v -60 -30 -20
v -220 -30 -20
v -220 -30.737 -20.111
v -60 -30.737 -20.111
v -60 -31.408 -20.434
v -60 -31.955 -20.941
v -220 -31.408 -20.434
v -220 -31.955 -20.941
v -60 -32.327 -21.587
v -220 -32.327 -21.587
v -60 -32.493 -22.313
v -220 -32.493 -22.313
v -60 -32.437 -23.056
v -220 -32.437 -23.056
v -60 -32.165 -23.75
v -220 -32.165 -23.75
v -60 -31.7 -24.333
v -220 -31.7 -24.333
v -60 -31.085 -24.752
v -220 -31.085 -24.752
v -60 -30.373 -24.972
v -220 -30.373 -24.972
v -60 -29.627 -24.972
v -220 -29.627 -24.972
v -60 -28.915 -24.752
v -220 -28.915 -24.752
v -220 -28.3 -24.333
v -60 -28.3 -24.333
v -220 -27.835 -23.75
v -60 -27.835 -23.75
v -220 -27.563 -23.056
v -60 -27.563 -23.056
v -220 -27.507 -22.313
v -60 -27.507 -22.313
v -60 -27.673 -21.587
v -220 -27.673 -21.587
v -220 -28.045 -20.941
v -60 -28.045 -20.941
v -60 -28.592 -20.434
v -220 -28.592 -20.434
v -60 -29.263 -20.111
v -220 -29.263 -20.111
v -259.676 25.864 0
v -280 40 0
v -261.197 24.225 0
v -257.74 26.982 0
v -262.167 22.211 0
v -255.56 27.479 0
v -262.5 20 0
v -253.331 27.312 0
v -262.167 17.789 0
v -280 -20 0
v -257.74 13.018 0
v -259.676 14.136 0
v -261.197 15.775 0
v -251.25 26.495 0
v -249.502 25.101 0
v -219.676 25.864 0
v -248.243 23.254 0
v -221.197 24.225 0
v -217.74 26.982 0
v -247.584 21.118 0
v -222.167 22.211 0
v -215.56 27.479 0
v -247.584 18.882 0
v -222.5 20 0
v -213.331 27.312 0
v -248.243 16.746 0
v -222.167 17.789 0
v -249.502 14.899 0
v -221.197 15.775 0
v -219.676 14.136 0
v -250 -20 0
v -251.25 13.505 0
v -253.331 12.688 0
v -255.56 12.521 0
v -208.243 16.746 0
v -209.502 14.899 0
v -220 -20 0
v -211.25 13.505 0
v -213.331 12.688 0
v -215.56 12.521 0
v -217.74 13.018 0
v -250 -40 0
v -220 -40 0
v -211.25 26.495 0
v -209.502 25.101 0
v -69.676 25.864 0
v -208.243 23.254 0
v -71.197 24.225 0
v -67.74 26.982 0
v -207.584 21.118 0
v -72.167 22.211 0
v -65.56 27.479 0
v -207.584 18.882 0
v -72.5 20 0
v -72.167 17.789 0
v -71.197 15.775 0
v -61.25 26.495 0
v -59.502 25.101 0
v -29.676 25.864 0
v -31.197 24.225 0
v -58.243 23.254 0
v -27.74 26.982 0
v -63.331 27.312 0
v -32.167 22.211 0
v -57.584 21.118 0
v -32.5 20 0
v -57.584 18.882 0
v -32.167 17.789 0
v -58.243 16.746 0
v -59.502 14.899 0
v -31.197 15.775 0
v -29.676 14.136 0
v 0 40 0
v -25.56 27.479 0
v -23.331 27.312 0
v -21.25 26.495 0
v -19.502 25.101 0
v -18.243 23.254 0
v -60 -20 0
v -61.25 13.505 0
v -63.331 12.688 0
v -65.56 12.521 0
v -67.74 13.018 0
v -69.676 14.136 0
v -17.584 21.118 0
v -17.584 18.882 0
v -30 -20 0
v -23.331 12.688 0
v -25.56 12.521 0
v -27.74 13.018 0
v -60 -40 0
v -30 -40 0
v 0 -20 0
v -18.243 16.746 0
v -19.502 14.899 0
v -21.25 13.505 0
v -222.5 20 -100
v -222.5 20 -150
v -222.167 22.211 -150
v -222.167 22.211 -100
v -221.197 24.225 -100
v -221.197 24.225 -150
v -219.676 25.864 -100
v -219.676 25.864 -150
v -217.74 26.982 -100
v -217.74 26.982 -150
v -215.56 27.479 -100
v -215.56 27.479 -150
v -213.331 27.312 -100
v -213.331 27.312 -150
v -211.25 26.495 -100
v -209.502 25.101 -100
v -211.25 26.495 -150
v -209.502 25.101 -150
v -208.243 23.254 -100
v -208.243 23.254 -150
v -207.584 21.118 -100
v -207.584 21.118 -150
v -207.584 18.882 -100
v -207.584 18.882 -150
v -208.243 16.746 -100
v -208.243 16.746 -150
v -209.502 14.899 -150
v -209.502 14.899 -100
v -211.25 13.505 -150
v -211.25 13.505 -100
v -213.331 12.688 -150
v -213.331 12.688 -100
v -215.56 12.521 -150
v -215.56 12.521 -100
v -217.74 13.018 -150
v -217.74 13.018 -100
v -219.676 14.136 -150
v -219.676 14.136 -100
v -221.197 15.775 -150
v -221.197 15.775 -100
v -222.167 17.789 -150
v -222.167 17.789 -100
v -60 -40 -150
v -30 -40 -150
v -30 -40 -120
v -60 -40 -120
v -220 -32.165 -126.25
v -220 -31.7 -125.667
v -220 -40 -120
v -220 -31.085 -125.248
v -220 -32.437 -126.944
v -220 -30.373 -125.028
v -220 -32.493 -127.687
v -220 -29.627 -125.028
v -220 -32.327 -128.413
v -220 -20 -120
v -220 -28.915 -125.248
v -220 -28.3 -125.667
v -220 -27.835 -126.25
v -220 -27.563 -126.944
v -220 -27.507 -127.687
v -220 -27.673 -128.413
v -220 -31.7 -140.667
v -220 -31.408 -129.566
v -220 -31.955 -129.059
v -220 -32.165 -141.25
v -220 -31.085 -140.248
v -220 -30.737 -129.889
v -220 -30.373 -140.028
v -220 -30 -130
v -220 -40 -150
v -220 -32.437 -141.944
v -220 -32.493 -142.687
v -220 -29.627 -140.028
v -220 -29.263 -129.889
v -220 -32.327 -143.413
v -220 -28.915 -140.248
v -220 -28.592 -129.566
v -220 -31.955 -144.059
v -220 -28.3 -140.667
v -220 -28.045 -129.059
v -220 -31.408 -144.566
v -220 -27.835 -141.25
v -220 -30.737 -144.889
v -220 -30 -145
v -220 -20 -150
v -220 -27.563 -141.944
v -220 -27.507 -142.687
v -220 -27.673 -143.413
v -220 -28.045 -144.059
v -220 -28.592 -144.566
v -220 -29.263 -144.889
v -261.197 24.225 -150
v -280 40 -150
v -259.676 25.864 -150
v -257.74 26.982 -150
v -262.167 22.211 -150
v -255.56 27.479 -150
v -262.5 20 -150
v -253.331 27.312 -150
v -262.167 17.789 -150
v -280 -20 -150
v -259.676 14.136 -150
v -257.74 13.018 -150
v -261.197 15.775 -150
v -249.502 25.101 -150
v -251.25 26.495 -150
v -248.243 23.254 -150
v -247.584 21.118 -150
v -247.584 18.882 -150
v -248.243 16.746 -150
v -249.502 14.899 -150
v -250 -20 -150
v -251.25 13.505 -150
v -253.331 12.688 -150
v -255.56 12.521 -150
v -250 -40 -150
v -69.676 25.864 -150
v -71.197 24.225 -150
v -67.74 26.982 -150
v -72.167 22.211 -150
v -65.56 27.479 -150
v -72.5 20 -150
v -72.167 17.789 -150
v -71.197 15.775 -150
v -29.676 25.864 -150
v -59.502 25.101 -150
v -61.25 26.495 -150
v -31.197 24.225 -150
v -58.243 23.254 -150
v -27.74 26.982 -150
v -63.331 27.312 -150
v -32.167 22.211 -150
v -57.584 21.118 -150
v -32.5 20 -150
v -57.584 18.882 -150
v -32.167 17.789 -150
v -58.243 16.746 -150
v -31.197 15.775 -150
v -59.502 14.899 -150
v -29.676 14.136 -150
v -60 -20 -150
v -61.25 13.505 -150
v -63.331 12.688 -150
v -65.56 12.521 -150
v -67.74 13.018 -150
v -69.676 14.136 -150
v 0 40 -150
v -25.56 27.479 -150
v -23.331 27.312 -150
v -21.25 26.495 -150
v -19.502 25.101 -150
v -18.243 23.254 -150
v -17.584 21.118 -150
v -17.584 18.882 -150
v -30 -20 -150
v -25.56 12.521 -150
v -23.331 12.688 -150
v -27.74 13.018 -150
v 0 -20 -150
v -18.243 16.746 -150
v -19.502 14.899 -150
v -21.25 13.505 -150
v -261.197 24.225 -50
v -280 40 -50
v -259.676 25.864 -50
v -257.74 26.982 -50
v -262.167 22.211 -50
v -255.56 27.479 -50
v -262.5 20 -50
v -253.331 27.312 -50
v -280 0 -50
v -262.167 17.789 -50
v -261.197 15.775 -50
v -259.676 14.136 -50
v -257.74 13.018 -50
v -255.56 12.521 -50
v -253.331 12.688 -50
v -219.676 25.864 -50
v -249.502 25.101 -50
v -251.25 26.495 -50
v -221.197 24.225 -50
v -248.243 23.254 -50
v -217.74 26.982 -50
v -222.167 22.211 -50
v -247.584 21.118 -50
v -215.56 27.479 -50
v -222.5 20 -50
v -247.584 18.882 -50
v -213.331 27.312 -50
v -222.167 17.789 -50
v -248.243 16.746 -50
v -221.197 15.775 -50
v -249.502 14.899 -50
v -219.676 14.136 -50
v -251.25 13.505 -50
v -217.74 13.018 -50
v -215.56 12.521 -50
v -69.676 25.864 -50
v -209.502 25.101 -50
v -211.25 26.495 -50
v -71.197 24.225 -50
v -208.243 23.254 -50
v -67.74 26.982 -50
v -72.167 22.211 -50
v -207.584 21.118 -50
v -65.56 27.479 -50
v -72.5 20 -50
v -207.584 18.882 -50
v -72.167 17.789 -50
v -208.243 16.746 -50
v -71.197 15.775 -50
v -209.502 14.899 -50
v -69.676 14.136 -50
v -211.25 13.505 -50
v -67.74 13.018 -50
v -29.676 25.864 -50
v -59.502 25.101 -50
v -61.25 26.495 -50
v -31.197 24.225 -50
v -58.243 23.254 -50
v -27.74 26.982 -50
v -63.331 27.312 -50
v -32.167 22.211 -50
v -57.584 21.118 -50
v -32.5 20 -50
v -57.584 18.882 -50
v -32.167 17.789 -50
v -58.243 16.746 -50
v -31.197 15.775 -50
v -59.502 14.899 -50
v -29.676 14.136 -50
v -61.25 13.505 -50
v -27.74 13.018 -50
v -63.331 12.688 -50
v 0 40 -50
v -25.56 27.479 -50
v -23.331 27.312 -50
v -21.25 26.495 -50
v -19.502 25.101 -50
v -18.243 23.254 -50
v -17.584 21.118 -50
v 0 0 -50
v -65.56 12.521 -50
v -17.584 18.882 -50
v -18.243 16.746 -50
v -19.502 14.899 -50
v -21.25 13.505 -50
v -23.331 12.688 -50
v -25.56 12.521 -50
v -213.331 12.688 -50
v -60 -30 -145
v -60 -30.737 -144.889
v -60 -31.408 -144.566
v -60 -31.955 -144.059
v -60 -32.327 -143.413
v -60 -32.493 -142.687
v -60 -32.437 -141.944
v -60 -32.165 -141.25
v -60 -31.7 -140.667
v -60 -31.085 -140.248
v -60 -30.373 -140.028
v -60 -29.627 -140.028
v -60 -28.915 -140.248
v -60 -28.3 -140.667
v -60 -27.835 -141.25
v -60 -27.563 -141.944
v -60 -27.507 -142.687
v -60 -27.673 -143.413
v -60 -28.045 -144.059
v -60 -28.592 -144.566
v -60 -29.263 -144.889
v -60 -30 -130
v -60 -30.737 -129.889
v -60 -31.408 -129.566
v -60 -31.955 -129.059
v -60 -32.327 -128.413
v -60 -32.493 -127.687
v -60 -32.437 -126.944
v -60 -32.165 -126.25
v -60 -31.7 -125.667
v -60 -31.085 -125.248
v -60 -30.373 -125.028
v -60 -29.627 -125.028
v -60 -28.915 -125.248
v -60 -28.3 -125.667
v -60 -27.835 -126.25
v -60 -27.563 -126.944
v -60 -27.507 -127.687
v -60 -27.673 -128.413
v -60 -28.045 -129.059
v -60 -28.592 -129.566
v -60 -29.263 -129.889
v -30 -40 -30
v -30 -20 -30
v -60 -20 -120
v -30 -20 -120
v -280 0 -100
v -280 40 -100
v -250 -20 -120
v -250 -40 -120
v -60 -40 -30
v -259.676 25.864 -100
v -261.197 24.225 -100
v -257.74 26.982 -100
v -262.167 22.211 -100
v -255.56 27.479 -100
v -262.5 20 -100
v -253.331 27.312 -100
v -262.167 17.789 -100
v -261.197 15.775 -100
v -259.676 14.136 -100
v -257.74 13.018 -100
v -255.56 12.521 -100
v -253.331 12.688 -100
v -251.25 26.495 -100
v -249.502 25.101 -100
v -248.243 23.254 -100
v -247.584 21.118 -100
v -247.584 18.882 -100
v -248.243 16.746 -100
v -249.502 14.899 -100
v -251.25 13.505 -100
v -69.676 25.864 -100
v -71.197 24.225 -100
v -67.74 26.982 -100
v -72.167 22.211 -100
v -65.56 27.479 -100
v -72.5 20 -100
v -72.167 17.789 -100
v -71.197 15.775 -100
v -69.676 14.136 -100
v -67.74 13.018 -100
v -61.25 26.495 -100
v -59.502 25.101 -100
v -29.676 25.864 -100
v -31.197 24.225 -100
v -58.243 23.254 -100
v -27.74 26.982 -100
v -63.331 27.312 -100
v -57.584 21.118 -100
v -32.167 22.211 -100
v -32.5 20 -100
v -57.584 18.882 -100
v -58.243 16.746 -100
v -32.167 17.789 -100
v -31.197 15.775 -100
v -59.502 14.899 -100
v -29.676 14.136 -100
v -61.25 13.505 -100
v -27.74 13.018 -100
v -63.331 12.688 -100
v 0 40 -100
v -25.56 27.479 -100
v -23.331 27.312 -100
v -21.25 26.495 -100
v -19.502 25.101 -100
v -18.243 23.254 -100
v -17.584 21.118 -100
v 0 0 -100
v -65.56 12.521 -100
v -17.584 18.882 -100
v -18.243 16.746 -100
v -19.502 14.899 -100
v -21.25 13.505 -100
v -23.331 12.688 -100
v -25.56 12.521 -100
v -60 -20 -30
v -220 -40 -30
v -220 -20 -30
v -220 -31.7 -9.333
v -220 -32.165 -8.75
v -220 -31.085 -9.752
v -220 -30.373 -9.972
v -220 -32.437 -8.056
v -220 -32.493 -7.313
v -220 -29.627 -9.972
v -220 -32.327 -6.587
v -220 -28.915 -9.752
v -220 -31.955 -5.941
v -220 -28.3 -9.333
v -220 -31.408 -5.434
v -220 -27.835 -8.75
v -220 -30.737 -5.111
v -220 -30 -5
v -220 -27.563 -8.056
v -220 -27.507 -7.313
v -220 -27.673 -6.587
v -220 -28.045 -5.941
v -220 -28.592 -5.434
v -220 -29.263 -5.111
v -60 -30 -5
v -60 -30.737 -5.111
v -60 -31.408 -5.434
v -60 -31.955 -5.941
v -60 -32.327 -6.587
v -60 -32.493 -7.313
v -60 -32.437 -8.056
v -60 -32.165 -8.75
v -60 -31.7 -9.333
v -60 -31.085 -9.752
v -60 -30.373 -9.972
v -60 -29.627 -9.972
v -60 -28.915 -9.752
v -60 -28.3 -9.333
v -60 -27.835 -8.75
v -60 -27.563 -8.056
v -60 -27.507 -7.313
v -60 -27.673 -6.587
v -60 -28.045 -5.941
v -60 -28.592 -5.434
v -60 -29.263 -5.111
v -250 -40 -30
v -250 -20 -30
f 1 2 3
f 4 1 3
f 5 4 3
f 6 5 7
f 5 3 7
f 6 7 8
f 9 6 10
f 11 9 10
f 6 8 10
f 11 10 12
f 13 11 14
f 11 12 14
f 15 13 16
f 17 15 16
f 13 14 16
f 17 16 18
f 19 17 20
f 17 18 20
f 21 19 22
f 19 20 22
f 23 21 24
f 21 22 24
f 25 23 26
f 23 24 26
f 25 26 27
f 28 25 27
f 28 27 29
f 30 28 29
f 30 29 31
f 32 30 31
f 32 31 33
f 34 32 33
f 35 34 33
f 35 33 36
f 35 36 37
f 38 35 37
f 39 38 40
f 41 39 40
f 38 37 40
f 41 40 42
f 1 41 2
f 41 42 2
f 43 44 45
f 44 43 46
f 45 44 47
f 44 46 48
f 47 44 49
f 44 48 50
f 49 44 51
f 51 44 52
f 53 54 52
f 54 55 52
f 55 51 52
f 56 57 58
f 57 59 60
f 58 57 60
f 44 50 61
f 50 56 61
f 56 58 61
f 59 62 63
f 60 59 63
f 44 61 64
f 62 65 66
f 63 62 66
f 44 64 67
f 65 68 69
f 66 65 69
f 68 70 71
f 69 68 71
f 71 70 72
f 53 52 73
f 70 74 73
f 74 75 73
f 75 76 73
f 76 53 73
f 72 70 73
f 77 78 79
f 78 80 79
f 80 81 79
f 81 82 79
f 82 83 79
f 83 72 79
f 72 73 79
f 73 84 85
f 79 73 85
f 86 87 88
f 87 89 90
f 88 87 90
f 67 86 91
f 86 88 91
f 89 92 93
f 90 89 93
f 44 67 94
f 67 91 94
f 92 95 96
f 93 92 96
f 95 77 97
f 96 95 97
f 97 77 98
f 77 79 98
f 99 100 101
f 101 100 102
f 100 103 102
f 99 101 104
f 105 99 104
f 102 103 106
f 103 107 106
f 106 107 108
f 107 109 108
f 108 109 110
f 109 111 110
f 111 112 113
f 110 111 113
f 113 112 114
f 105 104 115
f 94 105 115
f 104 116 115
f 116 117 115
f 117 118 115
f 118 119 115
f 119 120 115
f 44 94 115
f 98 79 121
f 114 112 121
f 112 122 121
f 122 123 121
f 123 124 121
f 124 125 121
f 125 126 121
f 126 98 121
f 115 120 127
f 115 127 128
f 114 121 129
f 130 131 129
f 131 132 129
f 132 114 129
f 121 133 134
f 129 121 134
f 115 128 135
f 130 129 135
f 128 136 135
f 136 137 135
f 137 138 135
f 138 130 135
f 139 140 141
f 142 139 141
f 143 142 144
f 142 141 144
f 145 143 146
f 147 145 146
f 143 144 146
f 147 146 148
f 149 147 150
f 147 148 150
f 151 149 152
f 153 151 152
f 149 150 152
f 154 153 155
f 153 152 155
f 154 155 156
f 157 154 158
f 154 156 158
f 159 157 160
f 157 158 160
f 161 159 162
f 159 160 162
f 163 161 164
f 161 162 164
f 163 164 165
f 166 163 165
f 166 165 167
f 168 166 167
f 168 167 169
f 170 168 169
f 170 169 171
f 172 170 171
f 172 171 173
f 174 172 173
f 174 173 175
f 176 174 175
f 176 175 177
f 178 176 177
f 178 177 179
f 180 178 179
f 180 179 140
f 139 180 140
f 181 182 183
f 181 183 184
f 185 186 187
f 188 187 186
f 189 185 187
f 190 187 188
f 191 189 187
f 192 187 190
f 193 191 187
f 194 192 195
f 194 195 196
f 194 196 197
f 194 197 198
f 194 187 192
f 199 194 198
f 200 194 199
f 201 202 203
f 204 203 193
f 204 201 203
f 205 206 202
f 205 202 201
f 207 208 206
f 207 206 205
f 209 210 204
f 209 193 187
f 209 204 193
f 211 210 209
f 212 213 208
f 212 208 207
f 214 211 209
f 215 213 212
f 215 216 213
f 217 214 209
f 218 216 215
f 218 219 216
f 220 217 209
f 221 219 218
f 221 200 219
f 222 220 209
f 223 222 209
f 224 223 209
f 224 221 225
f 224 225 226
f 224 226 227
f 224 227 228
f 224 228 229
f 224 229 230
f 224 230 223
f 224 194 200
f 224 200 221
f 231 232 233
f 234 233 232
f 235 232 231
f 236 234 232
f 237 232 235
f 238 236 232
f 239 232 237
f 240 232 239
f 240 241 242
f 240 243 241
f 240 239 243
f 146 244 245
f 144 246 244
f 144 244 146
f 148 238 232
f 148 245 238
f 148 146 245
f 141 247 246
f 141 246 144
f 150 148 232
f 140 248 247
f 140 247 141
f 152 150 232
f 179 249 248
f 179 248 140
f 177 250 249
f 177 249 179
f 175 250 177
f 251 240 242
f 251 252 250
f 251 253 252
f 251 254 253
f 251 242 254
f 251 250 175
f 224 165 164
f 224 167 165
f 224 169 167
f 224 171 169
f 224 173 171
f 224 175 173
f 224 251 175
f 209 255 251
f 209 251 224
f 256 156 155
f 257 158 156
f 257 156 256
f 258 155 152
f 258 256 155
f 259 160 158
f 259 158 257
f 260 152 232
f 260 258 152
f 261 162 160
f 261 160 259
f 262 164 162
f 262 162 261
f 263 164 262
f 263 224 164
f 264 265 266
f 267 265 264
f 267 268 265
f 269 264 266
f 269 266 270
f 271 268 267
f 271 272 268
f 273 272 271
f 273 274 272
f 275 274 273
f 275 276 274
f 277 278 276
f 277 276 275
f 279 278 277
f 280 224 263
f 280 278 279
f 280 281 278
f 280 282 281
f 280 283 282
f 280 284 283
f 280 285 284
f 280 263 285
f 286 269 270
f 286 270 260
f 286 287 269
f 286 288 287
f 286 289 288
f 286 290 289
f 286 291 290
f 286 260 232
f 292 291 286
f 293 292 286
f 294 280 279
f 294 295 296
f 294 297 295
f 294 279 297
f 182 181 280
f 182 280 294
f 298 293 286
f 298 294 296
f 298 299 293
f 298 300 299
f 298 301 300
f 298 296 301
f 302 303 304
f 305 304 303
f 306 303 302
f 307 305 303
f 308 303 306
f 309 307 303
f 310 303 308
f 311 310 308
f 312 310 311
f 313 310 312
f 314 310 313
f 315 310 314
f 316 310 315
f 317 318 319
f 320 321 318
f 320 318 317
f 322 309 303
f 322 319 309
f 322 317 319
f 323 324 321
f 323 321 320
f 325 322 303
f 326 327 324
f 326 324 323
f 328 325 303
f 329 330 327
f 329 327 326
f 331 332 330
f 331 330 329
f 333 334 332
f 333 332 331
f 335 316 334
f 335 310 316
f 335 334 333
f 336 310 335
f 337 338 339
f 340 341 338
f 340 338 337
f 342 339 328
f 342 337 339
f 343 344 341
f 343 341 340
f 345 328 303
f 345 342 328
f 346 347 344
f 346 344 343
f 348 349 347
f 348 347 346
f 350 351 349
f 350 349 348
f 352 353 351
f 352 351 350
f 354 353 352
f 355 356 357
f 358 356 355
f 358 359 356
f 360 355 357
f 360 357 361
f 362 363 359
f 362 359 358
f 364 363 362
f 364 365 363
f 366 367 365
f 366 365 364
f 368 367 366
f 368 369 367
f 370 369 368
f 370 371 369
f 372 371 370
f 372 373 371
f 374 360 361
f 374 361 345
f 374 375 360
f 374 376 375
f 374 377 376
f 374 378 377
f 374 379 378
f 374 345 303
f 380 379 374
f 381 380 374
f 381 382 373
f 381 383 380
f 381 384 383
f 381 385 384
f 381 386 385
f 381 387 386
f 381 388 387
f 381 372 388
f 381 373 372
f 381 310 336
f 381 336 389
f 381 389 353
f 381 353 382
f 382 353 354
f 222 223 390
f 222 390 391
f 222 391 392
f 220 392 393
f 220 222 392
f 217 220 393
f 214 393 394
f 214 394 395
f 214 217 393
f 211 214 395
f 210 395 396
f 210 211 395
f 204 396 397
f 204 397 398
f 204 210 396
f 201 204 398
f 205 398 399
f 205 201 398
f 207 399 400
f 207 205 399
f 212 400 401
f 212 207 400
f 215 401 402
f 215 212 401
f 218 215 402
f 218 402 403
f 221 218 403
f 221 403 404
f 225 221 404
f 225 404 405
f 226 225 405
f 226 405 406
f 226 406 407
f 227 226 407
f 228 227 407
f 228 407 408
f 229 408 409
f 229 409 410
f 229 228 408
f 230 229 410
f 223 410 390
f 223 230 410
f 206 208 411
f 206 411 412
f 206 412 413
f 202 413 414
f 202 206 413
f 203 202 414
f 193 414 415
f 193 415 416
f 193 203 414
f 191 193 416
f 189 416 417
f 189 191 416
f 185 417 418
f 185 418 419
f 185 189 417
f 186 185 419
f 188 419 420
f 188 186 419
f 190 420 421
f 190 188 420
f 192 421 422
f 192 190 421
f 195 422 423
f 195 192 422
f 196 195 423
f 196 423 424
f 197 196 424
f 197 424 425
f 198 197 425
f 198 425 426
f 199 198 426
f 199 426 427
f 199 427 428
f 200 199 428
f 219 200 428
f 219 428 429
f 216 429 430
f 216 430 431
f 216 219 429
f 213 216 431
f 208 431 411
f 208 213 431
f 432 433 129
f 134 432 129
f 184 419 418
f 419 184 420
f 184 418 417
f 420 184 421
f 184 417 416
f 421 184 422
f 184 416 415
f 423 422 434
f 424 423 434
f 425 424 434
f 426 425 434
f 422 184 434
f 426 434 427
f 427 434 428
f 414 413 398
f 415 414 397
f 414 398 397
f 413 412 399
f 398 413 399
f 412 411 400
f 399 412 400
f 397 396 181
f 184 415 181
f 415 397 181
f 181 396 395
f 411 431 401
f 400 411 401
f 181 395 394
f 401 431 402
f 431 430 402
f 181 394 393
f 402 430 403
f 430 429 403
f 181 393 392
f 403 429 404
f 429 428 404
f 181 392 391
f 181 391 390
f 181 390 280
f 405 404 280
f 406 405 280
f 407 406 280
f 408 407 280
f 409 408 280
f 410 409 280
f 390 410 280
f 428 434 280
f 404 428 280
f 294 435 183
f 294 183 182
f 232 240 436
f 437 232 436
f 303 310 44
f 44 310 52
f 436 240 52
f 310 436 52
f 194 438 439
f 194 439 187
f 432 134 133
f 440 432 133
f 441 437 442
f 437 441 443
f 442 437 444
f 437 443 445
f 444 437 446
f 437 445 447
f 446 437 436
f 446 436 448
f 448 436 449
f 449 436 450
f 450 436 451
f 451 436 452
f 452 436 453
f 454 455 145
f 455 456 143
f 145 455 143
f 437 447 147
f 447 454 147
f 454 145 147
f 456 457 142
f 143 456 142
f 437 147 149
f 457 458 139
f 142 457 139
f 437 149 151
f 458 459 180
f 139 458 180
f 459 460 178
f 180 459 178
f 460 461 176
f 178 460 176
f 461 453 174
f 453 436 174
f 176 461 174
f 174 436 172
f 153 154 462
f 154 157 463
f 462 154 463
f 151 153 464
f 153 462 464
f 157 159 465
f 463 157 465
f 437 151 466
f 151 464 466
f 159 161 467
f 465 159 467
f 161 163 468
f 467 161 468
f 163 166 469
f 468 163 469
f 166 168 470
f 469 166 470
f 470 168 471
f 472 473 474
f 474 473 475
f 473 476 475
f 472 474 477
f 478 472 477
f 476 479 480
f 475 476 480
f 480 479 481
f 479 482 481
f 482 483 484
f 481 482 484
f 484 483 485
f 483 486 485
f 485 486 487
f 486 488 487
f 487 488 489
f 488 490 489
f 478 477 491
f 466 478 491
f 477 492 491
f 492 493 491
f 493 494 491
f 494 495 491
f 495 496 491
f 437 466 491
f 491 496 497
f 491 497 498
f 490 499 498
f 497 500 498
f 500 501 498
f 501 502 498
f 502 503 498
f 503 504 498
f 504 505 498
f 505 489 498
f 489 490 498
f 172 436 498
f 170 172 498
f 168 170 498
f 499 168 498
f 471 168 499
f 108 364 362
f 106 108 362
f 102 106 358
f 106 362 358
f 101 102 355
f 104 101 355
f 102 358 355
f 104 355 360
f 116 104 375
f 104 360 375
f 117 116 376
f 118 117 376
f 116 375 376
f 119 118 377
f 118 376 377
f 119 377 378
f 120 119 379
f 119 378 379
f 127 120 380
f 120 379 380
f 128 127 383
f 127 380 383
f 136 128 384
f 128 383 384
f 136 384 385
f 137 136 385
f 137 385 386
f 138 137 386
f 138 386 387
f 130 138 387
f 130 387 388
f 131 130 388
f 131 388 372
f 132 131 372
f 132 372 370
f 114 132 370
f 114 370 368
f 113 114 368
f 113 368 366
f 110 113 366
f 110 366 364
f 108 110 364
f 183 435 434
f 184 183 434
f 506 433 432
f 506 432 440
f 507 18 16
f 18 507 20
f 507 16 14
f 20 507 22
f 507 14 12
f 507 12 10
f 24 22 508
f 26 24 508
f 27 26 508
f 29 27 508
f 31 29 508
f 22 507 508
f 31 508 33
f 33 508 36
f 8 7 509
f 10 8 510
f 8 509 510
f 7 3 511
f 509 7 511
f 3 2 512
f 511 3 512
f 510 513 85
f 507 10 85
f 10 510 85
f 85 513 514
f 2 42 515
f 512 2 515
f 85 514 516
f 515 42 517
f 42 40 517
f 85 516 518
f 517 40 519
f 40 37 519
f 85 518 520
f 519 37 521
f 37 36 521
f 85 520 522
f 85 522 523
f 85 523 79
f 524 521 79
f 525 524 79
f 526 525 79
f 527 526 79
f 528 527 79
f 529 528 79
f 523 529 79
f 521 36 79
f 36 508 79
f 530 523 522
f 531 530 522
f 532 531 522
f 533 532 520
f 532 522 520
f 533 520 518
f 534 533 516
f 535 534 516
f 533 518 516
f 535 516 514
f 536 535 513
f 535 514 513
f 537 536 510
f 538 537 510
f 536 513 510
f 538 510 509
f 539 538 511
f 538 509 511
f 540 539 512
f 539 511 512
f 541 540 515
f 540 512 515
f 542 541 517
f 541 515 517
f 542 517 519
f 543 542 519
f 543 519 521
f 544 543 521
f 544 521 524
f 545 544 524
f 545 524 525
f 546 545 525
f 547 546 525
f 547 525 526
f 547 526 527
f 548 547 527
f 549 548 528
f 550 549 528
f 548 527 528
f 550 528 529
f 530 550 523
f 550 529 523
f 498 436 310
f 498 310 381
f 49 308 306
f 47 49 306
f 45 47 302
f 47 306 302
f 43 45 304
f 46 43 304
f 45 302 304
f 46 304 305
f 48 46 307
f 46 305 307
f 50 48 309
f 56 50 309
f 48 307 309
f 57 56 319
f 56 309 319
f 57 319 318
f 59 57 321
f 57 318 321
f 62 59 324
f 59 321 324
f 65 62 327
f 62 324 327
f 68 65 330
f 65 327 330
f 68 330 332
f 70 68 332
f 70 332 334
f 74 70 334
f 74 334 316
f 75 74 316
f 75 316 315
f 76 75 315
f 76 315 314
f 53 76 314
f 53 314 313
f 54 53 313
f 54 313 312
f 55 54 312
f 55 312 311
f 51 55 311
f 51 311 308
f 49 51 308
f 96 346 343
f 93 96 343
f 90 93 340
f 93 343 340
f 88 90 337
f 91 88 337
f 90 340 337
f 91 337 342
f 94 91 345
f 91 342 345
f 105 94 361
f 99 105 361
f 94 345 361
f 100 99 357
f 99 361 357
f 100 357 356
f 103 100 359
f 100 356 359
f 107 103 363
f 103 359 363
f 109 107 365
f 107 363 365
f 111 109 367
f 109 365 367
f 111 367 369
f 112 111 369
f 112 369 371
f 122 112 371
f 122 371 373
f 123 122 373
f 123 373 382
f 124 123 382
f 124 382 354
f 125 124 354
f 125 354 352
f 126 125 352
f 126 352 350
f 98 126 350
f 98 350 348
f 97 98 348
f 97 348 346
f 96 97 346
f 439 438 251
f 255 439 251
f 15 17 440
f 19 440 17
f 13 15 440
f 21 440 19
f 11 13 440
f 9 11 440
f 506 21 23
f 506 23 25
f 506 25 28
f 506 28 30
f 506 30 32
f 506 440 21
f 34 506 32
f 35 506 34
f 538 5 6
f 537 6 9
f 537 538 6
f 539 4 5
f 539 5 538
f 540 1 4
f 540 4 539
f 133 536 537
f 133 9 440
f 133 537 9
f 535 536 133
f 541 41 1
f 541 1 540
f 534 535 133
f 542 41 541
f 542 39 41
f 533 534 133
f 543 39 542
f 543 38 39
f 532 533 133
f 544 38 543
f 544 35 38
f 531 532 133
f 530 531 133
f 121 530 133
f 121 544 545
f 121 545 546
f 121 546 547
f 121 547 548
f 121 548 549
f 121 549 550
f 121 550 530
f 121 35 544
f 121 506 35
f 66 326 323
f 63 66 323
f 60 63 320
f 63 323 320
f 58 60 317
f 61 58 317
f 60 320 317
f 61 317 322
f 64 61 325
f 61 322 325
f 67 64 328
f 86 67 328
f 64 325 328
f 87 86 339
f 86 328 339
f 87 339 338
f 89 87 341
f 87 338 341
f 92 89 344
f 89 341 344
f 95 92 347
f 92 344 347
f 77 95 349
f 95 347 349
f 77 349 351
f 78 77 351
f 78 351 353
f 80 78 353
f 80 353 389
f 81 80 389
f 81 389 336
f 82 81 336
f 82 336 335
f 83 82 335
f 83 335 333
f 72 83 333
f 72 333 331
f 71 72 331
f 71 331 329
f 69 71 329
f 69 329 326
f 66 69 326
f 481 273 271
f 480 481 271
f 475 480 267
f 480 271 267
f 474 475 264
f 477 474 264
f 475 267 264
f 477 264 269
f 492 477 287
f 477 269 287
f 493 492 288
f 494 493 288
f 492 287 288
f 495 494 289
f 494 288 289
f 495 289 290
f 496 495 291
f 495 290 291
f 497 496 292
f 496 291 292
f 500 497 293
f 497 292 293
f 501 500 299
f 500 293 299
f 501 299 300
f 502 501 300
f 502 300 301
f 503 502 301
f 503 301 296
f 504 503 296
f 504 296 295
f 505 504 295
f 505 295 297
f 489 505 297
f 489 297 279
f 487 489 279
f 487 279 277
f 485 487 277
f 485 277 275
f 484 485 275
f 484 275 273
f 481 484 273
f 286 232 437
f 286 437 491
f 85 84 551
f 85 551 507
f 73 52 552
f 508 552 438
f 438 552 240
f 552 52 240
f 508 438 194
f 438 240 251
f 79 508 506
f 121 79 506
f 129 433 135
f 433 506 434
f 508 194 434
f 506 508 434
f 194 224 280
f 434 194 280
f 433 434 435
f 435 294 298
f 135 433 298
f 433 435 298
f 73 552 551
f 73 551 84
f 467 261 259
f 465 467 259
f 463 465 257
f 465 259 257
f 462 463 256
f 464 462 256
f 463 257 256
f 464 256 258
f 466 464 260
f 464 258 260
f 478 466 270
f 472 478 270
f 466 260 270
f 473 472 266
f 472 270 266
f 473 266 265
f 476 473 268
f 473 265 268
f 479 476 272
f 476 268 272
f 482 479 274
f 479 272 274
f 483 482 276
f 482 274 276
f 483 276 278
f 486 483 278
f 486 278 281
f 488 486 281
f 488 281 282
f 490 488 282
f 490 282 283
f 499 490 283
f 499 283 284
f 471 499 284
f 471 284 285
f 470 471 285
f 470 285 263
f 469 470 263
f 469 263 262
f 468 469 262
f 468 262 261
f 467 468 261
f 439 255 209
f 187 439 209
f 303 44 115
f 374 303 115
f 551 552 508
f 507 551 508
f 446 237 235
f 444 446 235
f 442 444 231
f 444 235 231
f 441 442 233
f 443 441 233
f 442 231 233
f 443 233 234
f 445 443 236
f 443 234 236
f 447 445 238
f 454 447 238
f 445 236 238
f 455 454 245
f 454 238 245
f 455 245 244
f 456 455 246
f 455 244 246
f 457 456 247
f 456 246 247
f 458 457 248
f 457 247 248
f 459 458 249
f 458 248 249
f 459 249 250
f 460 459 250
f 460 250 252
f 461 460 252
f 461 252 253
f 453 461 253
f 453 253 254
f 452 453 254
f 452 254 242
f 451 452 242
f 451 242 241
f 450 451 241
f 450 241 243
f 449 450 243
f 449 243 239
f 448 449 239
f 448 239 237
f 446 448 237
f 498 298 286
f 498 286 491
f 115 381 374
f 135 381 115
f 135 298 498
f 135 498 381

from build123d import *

# Parameters (mm, degrees)
SKETCH1_W                                  = 280
SKETCH1_H                                  = 150
BOSS_EXTRUDE1_DEPTH                        = 20
SKETCH2_W                                  = 30
SKETCH2_H                                  = 30
BOSS_EXTRUDE2_DEPTH                        = 20
MIRROR1_AT_THE_SECOND_PLANE_COPY_1_SKETC_W = 30
MIRROR1_AT_THE_SECOND_PLANE_COPY_1_SKETC_H = 30
MIRROR1_AT_THE_SECOND_PLANE_COPY_1_DEPTH   = 20
SKETCH3_R                                  = 2.5
BOSS_EXTRUDE3_DEPTH                        = 160
SKETCH7_W                                  = 280
SKETCH7_H                                  = 50
BOSS_EXTRUDE5_DEPTH                        = 40
SKETCH8_R                                  = 7.5
CUT_EXTRUDE1_DEPTH                         = 321.156211872


with BuildPart() as part:
    # Sketch1 → Boss-Extrude1 (new body)
    with BuildSketch(Plane(origin=(0, 0, 0), x_dir=(1, 0, 0), z_dir=(0, 1, 0))):
        with Locations((-140, 75)):
            Rectangle(SKETCH1_W, SKETCH1_H)
    extrude(amount=-BOSS_EXTRUDE1_DEPTH)

    # Sketch2 → Boss-Extrude2 (add)
    with BuildSketch(Plane.XZ.offset(20)):
        with Locations((-235, -15)):
            Rectangle(SKETCH2_W, SKETCH2_H)
    boss_extrude2 = extrude(amount=BOSS_EXTRUDE2_DEPTH)

    # Mirror1: Boss-Extrude2 across plane
    add(boss_extrude2.mirror(Plane.ZY.offset(140)))

    # Mirror1 at the second plane: Boss-Extrude2 across plane
    add(boss_extrude2.mirror(Plane(origin=(0, 0, -75), x_dir=(1, 0, 0), z_dir=(0, 0, -1))))

    # Mirror1 at the second plane copy 1 sketc → Mirror1 at the second plane copy 1 (add)
    with BuildSketch(Plane(origin=(-280, -20, -150), x_dir=(-1, 0, 0), z_dir=(0, -1, 0))):
        with Locations((-235, -15)):
            Rectangle(MIRROR1_AT_THE_SECOND_PLANE_COPY_1_SKETC_W, MIRROR1_AT_THE_SECOND_PLANE_COPY_1_SKETC_H)
    extrude(amount=MIRROR1_AT_THE_SECOND_PLANE_COPY_1_DEPTH)

    # Sketch3 → Boss-Extrude3 (add)
    with BuildSketch(Plane(origin=(-220, 0, 0), x_dir=(0, 0, -1), z_dir=(1, 0, 0))):
        with Locations(Location((7.5, -30, 0), (0, 0, 180))):
            Circle(SKETCH3_R)
        with Locations(Location((22.5, -30, 0), (0, 0, 180))):
            Circle(SKETCH3_R)
    boss_extrude3 = extrude(amount=BOSS_EXTRUDE3_DEPTH)

    # Mirror2: Boss-Extrude3 across plane
    add(boss_extrude3.mirror(Plane(origin=(0, 0, -75), x_dir=(1, 0, 0), z_dir=(0, 0, -1))))

    # Sketch7 → Boss-Extrude5 (add)
    with BuildSketch(Plane(origin=(0, 0, 0), x_dir=(1, 0, 0), z_dir=(0, 1, 0))):
        with Locations((-140, 125)):
            Rectangle(SKETCH7_W, SKETCH7_H)
    boss_extrude5 = extrude(amount=BOSS_EXTRUDE5_DEPTH)

    # Mirror4: Boss-Extrude5 across plane
    add(boss_extrude5.mirror(Plane(origin=(0, 0, -75), x_dir=(1, 0, 0), z_dir=(0, 0, -1))))

    # Sketch8 → Cut-Extrude1 (cut, through all)
    with BuildSketch(Plane(origin=(0, 0, -150), x_dir=(-1, 0, 0), z_dir=(0, 0, -1))):
        with Locations((25, 20)):
            Circle(SKETCH8_R)
        with Locations((65, 20)):
            Circle(SKETCH8_R)
        with Locations((215, 20)):
            Circle(SKETCH8_R)
        with Locations((255, 20)):
            Circle(SKETCH8_R)
    extrude(amount=-CUT_EXTRUDE1_DEPTH, mode=Mode.SUBTRACT)


solid = part.part
